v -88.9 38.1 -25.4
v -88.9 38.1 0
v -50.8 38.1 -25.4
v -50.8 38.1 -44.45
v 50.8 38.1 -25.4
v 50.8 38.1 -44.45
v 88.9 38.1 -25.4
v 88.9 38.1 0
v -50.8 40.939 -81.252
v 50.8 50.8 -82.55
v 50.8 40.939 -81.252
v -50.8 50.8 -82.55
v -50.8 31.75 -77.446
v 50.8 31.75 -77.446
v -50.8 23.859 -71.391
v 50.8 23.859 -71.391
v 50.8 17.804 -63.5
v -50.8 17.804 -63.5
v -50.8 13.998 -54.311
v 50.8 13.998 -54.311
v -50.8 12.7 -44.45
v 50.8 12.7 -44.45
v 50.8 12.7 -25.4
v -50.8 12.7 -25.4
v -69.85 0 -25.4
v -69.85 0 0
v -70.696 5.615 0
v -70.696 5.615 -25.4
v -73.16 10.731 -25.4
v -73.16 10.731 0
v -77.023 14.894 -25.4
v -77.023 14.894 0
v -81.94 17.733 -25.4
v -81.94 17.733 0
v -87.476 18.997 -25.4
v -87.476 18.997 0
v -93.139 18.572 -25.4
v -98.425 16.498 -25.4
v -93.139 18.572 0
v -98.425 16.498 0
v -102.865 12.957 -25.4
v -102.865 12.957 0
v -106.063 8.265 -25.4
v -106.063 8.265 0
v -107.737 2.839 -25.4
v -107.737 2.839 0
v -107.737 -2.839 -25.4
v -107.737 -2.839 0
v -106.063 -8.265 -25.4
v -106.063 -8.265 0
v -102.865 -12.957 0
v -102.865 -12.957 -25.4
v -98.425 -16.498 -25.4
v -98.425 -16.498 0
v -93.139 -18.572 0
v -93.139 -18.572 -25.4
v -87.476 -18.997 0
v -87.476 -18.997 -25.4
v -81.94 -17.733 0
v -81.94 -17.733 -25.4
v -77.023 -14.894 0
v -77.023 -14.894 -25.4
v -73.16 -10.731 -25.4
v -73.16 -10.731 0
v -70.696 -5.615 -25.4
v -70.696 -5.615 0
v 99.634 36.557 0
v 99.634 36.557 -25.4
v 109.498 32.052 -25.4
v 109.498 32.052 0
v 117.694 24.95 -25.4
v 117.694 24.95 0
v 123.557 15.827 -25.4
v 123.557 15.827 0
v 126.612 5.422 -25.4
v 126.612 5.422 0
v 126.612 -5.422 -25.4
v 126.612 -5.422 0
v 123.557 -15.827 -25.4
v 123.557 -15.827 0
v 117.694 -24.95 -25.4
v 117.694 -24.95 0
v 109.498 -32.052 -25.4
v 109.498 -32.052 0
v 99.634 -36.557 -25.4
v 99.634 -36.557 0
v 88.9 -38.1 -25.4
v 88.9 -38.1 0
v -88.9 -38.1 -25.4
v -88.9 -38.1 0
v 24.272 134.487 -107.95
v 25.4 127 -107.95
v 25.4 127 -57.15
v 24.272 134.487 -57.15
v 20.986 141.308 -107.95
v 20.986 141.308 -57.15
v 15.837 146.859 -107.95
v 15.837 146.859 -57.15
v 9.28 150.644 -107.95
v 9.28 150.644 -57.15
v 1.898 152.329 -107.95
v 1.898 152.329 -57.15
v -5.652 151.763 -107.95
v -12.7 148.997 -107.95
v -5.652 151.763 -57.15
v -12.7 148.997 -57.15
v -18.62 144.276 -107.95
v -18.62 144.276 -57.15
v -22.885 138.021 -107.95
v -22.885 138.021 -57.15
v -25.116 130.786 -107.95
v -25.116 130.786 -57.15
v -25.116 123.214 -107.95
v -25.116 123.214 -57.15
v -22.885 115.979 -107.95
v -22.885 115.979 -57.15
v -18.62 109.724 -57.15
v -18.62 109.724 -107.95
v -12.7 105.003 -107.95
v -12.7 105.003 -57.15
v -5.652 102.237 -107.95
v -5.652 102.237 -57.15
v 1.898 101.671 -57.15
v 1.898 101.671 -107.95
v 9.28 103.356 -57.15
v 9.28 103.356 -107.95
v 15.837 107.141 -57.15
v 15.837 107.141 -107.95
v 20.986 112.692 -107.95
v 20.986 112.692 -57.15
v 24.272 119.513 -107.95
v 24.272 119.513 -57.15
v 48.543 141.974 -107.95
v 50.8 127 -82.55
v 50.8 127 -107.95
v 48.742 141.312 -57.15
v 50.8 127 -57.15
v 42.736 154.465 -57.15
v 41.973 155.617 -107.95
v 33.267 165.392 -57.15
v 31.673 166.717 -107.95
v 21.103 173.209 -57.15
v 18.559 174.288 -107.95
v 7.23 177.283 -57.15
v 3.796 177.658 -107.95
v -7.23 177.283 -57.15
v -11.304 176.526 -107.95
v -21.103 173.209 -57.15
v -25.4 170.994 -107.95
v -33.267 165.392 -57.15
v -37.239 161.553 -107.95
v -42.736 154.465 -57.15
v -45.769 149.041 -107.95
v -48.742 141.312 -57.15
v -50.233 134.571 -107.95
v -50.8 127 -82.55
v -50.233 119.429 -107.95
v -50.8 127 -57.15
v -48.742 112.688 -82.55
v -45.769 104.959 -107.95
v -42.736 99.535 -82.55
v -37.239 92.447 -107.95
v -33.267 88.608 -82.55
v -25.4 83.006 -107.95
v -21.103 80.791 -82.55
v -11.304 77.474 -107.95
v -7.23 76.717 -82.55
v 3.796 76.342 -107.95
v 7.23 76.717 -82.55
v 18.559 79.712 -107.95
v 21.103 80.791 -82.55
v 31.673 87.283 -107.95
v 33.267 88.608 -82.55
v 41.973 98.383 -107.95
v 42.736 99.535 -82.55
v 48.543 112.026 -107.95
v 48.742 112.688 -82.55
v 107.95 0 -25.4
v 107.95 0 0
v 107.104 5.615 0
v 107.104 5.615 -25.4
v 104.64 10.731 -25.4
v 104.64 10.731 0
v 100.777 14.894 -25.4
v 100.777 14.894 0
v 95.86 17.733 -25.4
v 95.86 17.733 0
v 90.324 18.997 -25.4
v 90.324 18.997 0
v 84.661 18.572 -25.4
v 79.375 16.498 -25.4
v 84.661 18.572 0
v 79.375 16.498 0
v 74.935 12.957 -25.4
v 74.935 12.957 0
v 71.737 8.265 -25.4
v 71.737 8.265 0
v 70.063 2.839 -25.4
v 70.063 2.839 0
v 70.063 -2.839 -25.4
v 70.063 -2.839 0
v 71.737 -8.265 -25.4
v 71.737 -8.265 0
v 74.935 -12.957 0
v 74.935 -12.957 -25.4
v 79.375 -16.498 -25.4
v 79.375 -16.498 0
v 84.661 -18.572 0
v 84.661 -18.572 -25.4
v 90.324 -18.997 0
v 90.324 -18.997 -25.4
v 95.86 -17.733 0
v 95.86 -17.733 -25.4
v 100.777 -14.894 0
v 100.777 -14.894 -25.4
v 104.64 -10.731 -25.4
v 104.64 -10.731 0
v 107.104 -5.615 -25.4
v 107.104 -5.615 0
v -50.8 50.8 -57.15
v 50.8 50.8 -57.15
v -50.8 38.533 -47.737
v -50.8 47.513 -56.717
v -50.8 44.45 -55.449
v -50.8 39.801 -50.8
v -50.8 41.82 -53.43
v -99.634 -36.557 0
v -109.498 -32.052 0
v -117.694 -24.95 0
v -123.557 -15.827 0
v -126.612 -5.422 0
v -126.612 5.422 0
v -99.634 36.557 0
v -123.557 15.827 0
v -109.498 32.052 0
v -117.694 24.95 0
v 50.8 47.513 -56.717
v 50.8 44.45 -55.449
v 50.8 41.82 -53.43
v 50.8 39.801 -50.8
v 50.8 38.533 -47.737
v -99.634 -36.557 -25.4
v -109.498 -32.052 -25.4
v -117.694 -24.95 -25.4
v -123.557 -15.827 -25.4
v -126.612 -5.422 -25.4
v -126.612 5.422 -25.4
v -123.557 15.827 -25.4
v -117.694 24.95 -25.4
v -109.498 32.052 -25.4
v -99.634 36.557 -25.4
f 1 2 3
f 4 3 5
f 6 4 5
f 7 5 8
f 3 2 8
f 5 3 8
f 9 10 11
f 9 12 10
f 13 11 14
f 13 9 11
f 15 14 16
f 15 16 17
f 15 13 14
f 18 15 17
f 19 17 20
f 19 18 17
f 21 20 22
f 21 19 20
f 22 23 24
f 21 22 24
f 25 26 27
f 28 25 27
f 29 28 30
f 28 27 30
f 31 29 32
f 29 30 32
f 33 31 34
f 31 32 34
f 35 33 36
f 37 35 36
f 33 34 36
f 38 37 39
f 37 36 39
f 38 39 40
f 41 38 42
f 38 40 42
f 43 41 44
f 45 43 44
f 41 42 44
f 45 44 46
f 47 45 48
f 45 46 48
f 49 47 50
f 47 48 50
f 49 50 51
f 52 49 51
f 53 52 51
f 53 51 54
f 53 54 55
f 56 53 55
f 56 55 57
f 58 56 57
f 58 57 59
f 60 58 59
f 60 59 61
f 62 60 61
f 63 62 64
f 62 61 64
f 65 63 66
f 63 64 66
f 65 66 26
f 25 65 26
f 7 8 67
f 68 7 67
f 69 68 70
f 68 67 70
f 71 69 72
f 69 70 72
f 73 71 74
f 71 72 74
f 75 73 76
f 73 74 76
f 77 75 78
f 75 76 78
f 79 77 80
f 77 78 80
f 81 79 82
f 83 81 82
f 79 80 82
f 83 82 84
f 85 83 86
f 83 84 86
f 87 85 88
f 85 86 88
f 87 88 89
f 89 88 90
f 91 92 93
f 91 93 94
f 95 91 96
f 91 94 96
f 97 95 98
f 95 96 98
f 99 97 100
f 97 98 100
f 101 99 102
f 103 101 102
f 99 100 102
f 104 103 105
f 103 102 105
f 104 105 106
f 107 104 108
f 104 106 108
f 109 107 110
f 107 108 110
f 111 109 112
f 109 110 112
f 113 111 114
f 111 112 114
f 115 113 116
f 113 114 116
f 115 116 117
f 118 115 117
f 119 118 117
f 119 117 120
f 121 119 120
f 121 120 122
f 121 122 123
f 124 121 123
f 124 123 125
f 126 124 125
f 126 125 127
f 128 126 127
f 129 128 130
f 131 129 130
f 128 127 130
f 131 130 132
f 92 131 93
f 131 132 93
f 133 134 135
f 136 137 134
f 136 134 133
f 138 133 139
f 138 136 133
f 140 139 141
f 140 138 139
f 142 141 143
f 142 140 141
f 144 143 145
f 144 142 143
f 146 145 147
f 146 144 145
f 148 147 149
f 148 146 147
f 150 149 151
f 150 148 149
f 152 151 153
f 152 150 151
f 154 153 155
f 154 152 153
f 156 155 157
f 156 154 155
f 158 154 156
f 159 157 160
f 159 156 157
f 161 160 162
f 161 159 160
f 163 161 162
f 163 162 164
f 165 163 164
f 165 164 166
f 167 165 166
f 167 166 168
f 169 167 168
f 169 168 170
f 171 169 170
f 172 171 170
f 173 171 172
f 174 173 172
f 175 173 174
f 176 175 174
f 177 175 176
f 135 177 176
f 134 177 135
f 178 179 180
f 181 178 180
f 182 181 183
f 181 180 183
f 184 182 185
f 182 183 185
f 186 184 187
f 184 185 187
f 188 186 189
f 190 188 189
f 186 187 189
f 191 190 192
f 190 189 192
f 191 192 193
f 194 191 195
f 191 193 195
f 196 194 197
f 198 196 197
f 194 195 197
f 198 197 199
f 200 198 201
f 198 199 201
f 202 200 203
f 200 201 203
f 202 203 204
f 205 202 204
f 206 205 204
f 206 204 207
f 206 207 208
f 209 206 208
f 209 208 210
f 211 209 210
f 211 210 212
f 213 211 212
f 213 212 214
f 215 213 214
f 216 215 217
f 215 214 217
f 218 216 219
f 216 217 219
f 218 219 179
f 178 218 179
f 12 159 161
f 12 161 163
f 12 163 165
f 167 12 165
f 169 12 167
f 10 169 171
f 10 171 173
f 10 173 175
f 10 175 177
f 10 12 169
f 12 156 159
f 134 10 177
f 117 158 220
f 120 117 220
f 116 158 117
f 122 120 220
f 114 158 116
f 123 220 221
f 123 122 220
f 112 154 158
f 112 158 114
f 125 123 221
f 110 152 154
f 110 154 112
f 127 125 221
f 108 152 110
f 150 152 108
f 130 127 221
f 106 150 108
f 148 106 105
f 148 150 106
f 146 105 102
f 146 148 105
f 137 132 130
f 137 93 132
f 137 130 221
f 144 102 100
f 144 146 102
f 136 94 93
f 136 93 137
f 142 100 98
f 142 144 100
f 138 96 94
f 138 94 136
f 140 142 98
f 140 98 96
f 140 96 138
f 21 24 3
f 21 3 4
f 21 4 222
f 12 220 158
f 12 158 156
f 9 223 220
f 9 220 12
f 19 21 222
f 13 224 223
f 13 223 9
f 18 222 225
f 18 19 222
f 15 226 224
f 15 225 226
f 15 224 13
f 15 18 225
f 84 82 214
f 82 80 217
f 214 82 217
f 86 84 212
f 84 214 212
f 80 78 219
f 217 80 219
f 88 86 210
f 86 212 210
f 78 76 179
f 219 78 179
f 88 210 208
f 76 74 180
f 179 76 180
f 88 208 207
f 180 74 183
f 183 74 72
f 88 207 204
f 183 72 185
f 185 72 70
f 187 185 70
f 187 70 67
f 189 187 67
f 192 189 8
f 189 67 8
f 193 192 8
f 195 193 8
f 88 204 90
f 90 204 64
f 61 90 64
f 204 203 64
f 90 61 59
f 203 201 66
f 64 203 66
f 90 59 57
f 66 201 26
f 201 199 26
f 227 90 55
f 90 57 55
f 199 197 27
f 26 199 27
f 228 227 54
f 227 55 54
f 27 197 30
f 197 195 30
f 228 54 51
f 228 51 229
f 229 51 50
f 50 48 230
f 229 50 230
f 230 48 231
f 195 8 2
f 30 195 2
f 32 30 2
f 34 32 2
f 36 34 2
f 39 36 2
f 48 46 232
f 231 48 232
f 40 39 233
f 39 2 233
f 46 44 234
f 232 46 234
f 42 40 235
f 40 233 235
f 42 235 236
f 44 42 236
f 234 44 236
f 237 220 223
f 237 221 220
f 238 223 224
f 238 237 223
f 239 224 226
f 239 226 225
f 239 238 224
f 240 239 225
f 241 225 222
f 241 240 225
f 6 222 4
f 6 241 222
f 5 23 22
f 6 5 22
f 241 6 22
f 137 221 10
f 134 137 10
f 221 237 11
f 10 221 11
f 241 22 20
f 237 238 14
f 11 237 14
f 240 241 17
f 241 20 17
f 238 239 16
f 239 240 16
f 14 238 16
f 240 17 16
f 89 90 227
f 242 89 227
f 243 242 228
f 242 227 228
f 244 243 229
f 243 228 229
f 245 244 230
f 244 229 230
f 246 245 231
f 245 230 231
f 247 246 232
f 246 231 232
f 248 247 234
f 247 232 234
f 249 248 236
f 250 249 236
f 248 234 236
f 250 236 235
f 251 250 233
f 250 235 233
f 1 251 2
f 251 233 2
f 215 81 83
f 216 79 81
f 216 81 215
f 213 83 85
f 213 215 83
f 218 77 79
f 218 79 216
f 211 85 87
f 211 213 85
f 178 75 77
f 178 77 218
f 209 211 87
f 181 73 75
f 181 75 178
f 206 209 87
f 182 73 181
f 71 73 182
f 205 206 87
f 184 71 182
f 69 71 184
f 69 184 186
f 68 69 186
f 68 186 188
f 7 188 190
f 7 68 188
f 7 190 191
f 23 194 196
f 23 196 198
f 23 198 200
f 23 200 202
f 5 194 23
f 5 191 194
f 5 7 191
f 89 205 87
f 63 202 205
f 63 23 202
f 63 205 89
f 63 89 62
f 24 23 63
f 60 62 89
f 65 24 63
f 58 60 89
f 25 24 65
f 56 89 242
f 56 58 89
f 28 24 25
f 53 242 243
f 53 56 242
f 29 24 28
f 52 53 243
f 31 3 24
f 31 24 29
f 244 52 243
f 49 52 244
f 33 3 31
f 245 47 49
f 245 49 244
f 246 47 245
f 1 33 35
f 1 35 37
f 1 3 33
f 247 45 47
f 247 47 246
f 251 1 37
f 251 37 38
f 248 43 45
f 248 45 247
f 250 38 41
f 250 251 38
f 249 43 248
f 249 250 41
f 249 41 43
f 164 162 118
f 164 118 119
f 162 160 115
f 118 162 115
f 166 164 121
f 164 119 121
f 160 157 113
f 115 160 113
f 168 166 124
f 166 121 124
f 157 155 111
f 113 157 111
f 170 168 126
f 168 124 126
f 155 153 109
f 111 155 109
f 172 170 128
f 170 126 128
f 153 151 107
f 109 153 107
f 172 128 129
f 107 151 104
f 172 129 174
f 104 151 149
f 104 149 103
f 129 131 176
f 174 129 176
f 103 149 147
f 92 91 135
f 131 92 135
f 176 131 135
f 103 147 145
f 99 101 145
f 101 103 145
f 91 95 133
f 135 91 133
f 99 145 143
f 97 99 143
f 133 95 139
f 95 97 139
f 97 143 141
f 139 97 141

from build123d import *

# Parameters (mm, degrees)
SKETCH1_R           = 19.05
BOSS_EXTRUDE1_DEPTH = 25.4
SKETCH2_W           = 101.6
SKETCH2_H           = 25.4
BOSS_EXTRUDE2_DEPTH = 57.15
SKETCH5_W           = 101.6
SKETCH5_H           = 25.4
BOSS_EXTRUDE3_DEPTH = 88.9
SKETCH6_R           = 50.8
BOSS_EXTRUDE4_DEPTH = 50.8
SKETCH7_R           = 25.4
CUT_EXTRUDE1_DEPTH  = 50.8
FILLET1_R           = 12.7
FILLET2_R           = 38.1


with BuildPart() as part:
    # Sketch1 → Boss-Extrude1 (new body)
    with BuildSketch(Plane.XY):
        with BuildLine():
            Line((-88.9, 38.1), (88.9, 38.1))
            ThreePointArc((88.9, 38.1), (127, 0), (88.9, -38.1))
            Line((88.9, -38.1), (-88.9, -38.1))
            ThreePointArc((-88.9, -38.1), (-127, 0), (-88.9, 38.1))
        make_face()
        with Locations((-88.9, 0)):
            Circle(SKETCH1_R, mode=Mode.SUBTRACT)
        with Locations((88.9, 0)):
            Circle(SKETCH1_R, mode=Mode.SUBTRACT)
    extrude(amount=-BOSS_EXTRUDE1_DEPTH)

    # Sketch2 → Boss-Extrude2 (add)
    with BuildSketch(Plane(origin=(0, 0, -25.4), x_dir=(-1, 0, 0), z_dir=(0, 0, -1))):
        with Locations((0, 25.4)):
            Rectangle(SKETCH2_W, SKETCH2_H)
    extrude(amount=BOSS_EXTRUDE2_DEPTH)

    # Sketch5 → Boss-Extrude3 (add)
    with BuildSketch(Plane(origin=(0, 38.1, 0), x_dir=(1, 0, 0), z_dir=(0, 1, 0))):
        with Locations((0, 69.85)):
            Rectangle(SKETCH5_W, SKETCH5_H)
    extrude(amount=BOSS_EXTRUDE3_DEPTH)

    # Sketch6 → Boss-Extrude4 (add)
    with BuildSketch(Plane.XY.offset(-57.15)):
        with Locations((0, 127)):
            Circle(SKETCH6_R)
    extrude(amount=-BOSS_EXTRUDE4_DEPTH)

    # Sketch7 → Cut-Extrude1 (cut)
    with BuildSketch(Plane.XY.offset(-57.15)):
        with Locations((0, 127)):
            Circle(SKETCH7_R)
    extrude(amount=-CUT_EXTRUDE1_DEPTH, mode=Mode.SUBTRACT)

    # Fillet1
    fillet1_edges = [part.edges().sort_by_distance(p)[0] for p in [
        (0, 38.1, -57.15),
    ]]
    fillet(fillet1_edges, radius=FILLET1_R)

    # Fillet2
    fillet2_edges = [part.edges().sort_by_distance(p)[0] for p in [
        (0, 12.7, -82.55),
    ]]
    fillet(fillet2_edges, radius=FILLET2_R)


solid = part.part
